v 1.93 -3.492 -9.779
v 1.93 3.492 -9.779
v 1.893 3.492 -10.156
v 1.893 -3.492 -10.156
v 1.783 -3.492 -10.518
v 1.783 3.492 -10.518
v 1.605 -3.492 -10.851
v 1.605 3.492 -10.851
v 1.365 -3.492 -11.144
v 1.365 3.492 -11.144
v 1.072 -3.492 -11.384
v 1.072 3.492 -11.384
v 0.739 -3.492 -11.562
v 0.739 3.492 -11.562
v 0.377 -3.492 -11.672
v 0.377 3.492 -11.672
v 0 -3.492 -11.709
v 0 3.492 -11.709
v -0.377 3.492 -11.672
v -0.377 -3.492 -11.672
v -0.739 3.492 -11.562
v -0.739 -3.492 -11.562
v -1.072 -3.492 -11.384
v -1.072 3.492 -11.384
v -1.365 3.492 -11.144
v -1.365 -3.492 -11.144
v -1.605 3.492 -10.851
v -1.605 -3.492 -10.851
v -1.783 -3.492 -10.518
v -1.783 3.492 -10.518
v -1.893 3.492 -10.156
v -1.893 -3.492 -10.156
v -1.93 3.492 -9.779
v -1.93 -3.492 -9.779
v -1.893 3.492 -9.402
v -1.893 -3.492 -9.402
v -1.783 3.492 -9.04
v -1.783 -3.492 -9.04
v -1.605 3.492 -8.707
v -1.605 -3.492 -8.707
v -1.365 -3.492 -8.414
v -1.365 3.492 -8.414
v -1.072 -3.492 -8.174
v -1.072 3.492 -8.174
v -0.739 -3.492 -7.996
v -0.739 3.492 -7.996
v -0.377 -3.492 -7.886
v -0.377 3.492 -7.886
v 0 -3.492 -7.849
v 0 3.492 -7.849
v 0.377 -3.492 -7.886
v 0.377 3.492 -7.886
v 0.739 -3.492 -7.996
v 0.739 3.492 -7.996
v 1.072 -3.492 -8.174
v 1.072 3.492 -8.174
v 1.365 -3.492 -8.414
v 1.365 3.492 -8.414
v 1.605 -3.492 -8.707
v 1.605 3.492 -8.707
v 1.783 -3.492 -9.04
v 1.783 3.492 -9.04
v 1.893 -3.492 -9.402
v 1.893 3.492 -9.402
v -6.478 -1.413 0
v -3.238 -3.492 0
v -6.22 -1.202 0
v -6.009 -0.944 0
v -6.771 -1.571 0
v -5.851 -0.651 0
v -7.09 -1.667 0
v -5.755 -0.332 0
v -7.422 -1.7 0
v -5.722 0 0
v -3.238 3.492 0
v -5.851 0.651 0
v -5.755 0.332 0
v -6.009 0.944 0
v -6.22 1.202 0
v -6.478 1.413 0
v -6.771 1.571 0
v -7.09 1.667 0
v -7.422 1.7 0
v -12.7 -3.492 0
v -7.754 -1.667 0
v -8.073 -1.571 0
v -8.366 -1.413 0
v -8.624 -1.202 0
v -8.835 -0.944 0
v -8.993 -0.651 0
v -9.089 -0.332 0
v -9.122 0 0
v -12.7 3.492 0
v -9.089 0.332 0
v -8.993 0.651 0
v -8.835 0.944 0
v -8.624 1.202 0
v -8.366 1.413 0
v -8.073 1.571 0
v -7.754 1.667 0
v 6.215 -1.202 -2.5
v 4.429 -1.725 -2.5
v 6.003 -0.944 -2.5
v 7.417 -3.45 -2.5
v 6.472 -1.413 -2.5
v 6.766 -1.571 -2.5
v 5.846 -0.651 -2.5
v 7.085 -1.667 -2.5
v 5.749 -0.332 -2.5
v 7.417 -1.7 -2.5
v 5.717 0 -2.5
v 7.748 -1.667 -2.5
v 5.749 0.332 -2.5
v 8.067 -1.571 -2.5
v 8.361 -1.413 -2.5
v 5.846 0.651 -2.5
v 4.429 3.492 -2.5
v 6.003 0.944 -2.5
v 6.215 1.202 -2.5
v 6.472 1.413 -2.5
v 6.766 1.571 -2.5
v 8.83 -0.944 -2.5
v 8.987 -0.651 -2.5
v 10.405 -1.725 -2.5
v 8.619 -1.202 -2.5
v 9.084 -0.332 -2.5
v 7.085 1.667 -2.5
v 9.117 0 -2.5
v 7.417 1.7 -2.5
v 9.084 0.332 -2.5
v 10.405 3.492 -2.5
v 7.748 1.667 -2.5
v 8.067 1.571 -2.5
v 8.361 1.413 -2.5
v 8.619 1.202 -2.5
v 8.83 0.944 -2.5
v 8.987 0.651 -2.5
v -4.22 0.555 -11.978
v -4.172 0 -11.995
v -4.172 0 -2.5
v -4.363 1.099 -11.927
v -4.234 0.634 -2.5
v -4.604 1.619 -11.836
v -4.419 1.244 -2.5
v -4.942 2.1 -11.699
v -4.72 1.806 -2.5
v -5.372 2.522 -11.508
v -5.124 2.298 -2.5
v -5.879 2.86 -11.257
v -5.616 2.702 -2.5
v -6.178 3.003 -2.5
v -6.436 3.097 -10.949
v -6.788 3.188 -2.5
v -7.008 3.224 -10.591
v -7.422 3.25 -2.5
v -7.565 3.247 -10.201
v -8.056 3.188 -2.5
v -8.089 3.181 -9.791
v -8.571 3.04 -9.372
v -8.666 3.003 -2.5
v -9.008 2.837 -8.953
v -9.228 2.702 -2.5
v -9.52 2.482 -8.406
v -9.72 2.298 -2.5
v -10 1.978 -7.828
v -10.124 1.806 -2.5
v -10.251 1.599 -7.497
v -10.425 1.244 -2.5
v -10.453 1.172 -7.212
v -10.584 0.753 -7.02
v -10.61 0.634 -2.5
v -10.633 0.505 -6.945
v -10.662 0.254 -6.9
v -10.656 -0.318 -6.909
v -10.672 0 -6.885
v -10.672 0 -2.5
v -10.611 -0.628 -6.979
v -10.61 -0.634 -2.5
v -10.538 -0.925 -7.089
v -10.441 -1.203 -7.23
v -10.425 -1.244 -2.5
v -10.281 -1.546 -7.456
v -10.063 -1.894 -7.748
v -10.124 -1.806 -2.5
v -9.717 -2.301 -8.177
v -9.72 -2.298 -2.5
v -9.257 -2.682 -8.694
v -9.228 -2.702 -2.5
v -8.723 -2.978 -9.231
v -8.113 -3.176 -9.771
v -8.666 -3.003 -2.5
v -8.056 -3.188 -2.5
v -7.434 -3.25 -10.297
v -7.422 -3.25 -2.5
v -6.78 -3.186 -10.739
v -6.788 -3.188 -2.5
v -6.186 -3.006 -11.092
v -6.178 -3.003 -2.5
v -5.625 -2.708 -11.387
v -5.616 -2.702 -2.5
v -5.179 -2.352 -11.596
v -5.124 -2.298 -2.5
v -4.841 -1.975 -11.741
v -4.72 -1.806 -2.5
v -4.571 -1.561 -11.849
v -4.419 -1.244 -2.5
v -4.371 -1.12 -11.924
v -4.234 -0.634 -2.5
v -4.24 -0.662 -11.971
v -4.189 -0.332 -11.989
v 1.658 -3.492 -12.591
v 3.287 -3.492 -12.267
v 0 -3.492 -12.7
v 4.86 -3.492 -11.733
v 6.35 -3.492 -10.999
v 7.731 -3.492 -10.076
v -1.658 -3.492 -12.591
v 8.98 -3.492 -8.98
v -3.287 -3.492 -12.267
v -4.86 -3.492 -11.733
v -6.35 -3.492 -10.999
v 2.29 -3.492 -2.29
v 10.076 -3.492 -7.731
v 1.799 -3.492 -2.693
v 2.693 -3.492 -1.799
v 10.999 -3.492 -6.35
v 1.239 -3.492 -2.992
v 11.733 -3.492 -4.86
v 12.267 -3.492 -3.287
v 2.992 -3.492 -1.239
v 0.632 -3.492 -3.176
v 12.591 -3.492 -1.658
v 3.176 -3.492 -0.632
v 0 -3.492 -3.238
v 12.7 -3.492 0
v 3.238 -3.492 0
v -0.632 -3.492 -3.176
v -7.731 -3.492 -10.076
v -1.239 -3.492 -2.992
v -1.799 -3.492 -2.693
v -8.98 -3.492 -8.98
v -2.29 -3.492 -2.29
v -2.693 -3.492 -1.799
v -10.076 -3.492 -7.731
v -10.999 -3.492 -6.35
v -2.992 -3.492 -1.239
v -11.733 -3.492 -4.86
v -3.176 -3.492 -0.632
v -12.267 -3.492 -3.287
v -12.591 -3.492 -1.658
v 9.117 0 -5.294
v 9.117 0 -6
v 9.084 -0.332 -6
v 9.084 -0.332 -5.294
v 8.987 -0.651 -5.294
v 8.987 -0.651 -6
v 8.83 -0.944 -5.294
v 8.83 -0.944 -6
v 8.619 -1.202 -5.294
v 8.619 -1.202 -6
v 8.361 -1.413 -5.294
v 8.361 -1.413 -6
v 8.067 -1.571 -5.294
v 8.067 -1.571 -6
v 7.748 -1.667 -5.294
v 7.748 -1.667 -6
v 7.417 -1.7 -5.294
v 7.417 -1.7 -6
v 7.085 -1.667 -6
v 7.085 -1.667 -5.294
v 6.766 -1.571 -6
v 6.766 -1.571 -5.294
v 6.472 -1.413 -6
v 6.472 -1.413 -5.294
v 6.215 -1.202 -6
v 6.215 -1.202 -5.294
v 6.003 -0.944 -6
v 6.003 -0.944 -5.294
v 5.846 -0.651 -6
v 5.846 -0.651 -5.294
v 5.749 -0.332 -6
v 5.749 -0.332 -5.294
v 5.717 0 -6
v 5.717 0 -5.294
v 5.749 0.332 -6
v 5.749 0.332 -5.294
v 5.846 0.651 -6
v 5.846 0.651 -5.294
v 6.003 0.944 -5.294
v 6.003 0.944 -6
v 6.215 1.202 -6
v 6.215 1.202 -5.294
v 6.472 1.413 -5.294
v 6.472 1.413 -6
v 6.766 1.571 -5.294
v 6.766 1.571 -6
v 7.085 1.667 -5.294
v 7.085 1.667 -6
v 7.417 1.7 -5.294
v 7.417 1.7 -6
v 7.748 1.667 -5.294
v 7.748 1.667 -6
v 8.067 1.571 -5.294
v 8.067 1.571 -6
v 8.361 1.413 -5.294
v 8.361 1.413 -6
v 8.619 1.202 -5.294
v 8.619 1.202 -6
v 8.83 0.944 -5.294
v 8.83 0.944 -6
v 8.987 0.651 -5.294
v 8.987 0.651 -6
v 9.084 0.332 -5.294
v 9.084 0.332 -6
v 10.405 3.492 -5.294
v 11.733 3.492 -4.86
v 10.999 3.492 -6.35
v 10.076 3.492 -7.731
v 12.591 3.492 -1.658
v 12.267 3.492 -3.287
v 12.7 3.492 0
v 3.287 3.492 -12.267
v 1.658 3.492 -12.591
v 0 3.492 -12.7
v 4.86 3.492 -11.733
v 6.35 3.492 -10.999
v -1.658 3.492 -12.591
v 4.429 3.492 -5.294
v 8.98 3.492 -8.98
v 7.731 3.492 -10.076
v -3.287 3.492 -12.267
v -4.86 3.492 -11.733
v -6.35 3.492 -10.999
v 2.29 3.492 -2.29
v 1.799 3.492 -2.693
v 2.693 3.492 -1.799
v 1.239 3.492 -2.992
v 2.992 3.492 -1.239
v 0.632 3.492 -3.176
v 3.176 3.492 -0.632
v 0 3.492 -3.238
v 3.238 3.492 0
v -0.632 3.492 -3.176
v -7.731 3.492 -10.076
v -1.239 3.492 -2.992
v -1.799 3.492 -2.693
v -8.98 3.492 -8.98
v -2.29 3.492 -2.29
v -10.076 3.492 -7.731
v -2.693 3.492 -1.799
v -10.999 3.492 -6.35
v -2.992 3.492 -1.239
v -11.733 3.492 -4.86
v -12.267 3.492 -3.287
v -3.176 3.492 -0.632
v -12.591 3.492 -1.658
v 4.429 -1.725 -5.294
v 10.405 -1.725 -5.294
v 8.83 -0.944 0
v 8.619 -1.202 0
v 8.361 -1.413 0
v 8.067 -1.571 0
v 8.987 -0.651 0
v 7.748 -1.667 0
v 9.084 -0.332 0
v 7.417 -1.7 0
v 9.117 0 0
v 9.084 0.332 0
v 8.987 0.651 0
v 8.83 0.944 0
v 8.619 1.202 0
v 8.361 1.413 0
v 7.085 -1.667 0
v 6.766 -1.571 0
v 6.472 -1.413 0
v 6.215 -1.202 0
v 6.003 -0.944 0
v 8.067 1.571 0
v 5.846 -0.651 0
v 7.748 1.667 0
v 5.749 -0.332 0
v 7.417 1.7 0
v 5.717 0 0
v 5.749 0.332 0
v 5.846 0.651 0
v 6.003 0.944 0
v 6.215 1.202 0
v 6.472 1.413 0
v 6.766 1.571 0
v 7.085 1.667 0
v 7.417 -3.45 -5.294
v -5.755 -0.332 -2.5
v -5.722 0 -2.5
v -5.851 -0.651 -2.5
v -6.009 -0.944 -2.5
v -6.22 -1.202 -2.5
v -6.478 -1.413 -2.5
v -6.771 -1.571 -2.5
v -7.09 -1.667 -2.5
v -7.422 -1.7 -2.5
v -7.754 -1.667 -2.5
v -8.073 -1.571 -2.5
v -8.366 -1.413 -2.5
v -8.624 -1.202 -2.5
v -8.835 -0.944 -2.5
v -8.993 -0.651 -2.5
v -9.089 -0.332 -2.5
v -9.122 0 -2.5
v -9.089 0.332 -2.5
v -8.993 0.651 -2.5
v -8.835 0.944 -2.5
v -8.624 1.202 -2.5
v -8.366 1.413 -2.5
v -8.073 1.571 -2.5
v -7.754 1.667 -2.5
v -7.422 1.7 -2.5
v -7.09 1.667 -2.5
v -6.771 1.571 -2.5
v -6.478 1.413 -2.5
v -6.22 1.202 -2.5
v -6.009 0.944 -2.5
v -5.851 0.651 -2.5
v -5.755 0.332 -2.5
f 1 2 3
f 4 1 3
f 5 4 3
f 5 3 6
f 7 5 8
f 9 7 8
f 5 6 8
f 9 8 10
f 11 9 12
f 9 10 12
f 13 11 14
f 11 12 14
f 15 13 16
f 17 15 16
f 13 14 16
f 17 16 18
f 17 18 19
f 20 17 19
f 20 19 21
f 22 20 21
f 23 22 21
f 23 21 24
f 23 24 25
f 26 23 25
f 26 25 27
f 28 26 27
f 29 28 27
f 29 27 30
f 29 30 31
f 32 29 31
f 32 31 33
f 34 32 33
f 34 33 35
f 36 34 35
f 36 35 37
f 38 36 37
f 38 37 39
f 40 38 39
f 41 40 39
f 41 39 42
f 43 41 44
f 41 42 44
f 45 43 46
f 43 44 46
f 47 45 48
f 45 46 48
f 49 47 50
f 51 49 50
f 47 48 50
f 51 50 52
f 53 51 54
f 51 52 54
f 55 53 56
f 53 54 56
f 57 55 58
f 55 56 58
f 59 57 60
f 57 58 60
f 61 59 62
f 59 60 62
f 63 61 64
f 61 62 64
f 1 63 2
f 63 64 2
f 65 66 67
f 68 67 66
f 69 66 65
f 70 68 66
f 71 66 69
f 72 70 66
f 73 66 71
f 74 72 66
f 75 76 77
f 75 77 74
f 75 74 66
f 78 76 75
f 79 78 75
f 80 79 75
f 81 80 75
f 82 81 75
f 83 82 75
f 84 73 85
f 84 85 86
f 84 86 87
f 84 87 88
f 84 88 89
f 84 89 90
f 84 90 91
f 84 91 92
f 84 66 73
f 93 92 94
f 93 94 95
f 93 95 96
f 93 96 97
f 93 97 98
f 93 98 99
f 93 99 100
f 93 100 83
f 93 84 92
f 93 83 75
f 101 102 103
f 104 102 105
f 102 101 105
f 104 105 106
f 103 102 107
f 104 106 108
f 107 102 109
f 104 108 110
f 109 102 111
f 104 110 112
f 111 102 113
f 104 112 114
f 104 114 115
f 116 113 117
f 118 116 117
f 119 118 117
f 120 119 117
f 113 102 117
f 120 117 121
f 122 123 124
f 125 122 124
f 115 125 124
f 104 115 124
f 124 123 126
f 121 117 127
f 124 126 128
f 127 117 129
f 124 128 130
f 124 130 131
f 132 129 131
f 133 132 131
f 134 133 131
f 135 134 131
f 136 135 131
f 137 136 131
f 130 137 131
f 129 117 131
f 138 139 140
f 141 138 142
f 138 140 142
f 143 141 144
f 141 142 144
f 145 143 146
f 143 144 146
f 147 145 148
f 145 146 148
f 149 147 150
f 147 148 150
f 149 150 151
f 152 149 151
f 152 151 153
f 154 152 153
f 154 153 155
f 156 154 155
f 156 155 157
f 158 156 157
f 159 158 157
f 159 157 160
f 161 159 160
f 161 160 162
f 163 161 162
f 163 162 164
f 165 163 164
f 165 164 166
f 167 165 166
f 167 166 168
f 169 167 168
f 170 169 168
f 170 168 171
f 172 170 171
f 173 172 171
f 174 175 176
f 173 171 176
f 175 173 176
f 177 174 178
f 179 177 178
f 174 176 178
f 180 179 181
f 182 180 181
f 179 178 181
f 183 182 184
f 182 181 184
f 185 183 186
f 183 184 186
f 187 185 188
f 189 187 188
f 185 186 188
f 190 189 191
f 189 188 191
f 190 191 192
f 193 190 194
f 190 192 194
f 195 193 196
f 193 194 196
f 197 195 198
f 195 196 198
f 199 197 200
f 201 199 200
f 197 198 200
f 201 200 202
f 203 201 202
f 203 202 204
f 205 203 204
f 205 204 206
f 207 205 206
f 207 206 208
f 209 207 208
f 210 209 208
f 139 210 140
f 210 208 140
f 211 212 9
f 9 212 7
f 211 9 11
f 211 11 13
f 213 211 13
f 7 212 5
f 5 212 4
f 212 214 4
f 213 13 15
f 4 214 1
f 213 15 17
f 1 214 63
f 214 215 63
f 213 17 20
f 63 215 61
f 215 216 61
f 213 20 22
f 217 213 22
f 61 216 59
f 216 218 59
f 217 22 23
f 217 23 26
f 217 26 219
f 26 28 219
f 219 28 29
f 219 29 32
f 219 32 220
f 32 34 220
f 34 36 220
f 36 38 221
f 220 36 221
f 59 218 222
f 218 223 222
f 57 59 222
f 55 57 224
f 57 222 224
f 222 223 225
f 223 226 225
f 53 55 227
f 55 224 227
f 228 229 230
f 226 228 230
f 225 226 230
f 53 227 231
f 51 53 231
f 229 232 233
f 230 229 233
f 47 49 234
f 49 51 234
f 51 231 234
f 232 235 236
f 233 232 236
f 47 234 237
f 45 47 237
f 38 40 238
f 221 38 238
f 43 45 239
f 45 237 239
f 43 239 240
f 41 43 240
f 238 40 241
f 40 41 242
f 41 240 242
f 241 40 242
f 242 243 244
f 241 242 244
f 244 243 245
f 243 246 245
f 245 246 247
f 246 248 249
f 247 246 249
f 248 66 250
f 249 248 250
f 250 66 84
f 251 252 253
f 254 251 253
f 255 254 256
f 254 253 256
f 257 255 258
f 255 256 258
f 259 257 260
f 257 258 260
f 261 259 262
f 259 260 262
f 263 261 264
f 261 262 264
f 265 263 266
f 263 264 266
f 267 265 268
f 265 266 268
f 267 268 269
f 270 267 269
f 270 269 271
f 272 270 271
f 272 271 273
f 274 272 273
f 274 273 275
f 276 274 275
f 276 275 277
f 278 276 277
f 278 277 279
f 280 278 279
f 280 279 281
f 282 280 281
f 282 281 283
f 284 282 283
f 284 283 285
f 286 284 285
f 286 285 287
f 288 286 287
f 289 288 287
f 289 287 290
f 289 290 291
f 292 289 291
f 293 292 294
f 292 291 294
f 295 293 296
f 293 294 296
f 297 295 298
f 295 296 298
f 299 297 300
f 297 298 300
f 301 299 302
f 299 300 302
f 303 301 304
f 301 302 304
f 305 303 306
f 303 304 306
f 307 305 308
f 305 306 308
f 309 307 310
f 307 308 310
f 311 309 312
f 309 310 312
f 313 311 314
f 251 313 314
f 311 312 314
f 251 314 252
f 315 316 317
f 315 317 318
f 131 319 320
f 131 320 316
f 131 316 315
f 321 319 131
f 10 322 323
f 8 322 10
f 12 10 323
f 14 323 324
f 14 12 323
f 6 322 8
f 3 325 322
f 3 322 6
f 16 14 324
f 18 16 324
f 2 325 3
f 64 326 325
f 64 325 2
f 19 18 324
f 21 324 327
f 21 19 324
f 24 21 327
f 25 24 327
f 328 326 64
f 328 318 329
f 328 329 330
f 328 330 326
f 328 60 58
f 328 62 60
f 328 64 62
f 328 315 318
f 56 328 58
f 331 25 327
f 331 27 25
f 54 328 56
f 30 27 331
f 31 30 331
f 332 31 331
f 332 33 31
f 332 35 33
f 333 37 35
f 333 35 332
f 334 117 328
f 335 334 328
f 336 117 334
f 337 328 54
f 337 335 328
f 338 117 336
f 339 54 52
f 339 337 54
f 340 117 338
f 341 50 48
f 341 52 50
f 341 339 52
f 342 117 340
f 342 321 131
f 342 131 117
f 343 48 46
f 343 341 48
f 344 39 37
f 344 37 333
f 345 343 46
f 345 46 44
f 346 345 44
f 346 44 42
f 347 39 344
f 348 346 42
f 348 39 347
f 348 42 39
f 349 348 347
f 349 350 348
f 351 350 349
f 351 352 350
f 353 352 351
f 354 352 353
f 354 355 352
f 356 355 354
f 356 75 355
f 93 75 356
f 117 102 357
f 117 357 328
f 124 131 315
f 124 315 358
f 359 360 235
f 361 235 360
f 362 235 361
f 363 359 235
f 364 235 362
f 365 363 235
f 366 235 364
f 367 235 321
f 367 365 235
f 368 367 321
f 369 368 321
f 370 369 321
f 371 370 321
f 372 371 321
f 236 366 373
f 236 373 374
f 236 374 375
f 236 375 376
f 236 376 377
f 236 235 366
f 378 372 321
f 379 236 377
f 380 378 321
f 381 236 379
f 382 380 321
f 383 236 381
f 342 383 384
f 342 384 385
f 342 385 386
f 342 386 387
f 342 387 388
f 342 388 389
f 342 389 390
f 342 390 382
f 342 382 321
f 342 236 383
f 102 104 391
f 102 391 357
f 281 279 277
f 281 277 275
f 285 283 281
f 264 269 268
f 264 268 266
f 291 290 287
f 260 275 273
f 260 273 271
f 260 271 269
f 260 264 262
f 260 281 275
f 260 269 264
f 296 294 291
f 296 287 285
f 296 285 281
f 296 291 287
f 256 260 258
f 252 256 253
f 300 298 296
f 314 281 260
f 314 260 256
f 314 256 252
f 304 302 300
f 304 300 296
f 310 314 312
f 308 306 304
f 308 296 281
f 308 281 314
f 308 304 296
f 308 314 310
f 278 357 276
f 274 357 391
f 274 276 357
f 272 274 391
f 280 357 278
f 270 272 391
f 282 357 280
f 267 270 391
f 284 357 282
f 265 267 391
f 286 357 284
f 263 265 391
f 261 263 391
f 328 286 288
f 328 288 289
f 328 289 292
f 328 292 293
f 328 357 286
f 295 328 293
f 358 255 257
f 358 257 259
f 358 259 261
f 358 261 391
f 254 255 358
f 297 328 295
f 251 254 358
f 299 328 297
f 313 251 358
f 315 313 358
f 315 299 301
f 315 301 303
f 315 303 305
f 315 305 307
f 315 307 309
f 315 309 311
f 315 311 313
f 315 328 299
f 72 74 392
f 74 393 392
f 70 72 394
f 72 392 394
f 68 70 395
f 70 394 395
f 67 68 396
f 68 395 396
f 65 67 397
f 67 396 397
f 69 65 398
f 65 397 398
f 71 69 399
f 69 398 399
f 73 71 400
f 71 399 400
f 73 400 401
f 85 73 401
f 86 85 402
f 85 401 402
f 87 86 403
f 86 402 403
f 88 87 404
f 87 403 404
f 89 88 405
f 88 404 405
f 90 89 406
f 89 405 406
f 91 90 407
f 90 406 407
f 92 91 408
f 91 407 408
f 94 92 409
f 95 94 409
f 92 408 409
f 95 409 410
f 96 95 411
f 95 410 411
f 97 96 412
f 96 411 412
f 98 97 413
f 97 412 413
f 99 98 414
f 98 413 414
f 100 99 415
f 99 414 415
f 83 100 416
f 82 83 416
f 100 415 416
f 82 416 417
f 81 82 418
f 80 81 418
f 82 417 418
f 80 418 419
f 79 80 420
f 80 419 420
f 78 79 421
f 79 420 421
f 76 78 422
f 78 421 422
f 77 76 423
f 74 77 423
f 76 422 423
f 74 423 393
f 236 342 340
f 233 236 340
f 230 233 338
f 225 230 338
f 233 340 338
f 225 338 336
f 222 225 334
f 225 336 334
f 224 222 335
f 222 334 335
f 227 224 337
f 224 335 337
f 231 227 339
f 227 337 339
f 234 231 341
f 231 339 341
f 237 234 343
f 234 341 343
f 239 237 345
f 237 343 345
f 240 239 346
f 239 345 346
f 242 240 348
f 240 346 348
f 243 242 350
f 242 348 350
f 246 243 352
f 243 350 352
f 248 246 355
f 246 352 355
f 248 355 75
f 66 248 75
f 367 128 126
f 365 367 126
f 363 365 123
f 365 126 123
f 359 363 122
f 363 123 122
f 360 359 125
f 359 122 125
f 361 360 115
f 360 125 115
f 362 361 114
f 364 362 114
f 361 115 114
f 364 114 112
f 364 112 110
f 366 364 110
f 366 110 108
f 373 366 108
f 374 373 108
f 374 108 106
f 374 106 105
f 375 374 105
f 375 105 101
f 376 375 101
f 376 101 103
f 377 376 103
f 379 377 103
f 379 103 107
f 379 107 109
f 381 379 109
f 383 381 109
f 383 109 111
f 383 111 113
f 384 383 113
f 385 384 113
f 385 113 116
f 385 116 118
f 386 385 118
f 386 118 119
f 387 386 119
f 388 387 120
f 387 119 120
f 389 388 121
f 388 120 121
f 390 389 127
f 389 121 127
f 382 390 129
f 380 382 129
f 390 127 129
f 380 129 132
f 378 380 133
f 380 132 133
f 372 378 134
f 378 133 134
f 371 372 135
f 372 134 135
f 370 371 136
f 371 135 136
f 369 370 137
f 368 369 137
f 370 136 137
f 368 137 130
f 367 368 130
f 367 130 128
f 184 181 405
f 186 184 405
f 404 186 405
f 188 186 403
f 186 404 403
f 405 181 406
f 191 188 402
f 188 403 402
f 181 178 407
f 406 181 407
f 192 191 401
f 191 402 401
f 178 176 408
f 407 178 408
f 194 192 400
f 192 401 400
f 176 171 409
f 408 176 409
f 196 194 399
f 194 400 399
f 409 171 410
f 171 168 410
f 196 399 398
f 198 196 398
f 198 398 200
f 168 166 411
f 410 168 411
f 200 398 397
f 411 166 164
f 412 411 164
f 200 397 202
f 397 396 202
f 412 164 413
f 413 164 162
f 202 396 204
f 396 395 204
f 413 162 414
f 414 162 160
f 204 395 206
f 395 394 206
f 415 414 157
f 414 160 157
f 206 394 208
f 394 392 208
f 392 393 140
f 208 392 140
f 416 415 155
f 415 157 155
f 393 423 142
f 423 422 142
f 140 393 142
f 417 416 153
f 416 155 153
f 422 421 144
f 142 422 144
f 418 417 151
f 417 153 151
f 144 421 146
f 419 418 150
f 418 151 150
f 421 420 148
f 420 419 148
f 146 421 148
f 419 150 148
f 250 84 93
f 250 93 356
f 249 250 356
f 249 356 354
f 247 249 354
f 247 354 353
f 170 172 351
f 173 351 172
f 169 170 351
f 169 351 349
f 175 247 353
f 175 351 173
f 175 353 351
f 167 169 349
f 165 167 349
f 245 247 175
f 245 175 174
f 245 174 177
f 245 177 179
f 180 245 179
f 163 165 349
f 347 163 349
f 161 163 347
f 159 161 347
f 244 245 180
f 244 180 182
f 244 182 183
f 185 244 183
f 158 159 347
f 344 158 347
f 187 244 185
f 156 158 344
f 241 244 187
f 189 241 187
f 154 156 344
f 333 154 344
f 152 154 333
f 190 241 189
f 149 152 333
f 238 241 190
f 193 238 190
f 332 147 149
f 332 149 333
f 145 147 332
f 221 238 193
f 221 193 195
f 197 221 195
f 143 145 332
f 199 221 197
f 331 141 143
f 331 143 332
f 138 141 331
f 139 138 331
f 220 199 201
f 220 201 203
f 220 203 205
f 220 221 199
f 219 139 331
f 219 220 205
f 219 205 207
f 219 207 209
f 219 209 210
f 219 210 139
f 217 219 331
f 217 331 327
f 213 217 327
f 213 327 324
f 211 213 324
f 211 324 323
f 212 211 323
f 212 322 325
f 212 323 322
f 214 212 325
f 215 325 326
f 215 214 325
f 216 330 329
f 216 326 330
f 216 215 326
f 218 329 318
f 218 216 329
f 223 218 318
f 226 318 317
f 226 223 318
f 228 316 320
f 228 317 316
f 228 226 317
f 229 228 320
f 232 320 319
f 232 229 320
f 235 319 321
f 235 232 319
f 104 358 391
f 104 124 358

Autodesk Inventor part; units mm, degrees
sketch "Sketch1" plane through (0, 0, 0) normal (0, 1, 0) x (-1, 0, 0)
  circle A0 centre (0, 0) radius 12.7
  dimension "d75" = 25.4
extrude "Extrusion1" add sketch "Sketch1" along normal blind 3.4925 and the other way blind 3.4925
ref_plane "Work Plane1" through (0, 0, 2.5) normal (0, 0, 1) x (1, 0, 0)
ref_plane "Work Plane2" through (0, 0, -2.5) normal (0, 0, 1) x (1, 0, 0)
sketch "Sketch2" plane through (0, 0, 0) normal (0, 0, 1) x (1, 0, 0)
  circle A0 centre (7.4168, 0) radius 1.7
  circle A1 centre (-7.4168, 0) radius 1.7
  point P0 (0, 0)
  dimension "d5" = 3.4
  dimension "d6" = 7.4168
  dimension "d7" = 3.4
  dimension "d8" = 7.4168
extrude "Screw hole 2" cut sketch "Sketch2" along normal blind 2.5 and the other way blind 6 contours A0
sketch "Sketch3" plane through (0, 0, 2.5) normal (0, 0, 1) x (1, 0, 0)
  circle A0 centre (7.4168, 0) radius 1.7 projected
  circle A1 centre (7.4168, 0) radius 3.25
  point P0 (0, 0)
  dimension "d19" = 6.5
sketch "Sketch4" plane through (0, 0, -2.5) normal (0, 0, 1) x (1, 0, 0)
  circle A0 centre (7.4168, 0) radius 1.7 projected
  circle A1 centre (7.4168, 0) radius 3.45 construction
  line L0 (7.4168, -3.45) -> (4.429, -1.725)
  line L1 (4.429, -1.725) -> (4.429, 6.985)
  line L2 (10.4046, 6.985) -> (10.4046, -1.725)
  line L3 (10.4046, -1.725) -> (7.4168, -3.45)
  line L4 (10.4046, 6.985) -> (4.429, 6.985)
  point P0 (0, 0)
  dimension "d22" = 6.9
sketch "Sketch5" plane through (0, 0, -2.5) normal (0, 0, 1) x (1, 0, 0)
  circle A0 centre (-7.422, 0) radius 3.25
  point P0 (0, 0)
  dimension "d25" = 6.5
extrude "Access Hole 1" cut sketch "Sketch5" against normal through all
extrude "Access Hole 2" cut sketch "Sketch3" along normal through all contours A0 | A1
extrude "Nut well 2" cut sketch "Sketch4" against normal blind 2.794 contours A0 | L0 L1 L4 L2 L3
sketch "Sketch7" plane through (0, 0, 2.5) normal (0, 0, 1) x (1, 0, 0)
  circle A0 centre (-7.422, 0) radius 3.25 construction
  circle A1 centre (-7.422, 0) radius 3.45 construction
  line L0 (-7.422, -3.25) -> (-10.2365, -1.625)
  line L1 (-10.2365, -1.625) -> (-10.2365, 5.3975)
  line L2 (-4.6074, 5.3975) -> (-4.6074, -1.625)
  line L3 (-4.6074, -1.625) -> (-7.422, -3.25)
  line L4 (16.6201, 5.3975) -> (-16.6201, 5.3975) projected
  line L5 (-10.2365, 5.3975) -> (-4.6074, 5.3975)
  point P0 (0, 0)
  dimension "d48" = 6.9
extrude "Nut Well 1" cut sketch "Sketch7" along normal blind 2.794
sketch "Sketch8" plane through (0, 0, 0) normal (0, 0, 1) x (1, 0, 0)
  circle A0 centre (-7.422, 0) radius 3.25 projected
  circle A1 centre (-7.422, 0) radius 1.7
  point P0 (0, 0)
  dimension "d51" = 3.4
extrude "Screw Hole 1" cut sketch "Sketch8" along normal blind 6 and the other way blind 2.5 contours A1
ref_plane "Work Plane3" through (0, 5.3975, 0) normal (0, 1, 0) x (1, 0, 0)
sketch "Sketch9" plane through (0, 5.3975, 0) normal (0, 1, 0) x (1, 0, 0)
  arc A0 (1.9431, -2.5908) -> (-1.9431, -2.5908) centre (0, 0) ccw
  line L0 (-1.9431, -2.5908) -> (1.9431, -2.5908)
  dimension "d56" = 6.477
  dimension "d57" = 2.5908
extrude "Center shaft" cut sketch "Sketch9" against normal through all
ref_plane "Work Plane4" through (0, 5.3975, 0) normal (0, 1, 0) x (1, 0, 0)
sketch "Sketch10" plane through (0, 5.3975, 0) normal (0, 1, 0) x (1, 0, 0)
  circle A0 centre (0, 9.779) radius 1.9304
  circle A1 centre (0, -9.779) radius 1.9304
  point P0 (0, 0)
  point P1 (0, -8.001)
  dimension "d60" = 3.8608
  dimension "d61" = 9.779
  dimension "d62" = 3.8608
  dimension "d63" = 9.779
extrude "Wheel holes" cut sketch "Sketch10" against normal through all
split "Split1" plane through (0, 0, 0) removes the side toward (0, 0, 1)
equation "\"d63\" = d61"
properties part number "clamping hub .770 .25 D bore right"
